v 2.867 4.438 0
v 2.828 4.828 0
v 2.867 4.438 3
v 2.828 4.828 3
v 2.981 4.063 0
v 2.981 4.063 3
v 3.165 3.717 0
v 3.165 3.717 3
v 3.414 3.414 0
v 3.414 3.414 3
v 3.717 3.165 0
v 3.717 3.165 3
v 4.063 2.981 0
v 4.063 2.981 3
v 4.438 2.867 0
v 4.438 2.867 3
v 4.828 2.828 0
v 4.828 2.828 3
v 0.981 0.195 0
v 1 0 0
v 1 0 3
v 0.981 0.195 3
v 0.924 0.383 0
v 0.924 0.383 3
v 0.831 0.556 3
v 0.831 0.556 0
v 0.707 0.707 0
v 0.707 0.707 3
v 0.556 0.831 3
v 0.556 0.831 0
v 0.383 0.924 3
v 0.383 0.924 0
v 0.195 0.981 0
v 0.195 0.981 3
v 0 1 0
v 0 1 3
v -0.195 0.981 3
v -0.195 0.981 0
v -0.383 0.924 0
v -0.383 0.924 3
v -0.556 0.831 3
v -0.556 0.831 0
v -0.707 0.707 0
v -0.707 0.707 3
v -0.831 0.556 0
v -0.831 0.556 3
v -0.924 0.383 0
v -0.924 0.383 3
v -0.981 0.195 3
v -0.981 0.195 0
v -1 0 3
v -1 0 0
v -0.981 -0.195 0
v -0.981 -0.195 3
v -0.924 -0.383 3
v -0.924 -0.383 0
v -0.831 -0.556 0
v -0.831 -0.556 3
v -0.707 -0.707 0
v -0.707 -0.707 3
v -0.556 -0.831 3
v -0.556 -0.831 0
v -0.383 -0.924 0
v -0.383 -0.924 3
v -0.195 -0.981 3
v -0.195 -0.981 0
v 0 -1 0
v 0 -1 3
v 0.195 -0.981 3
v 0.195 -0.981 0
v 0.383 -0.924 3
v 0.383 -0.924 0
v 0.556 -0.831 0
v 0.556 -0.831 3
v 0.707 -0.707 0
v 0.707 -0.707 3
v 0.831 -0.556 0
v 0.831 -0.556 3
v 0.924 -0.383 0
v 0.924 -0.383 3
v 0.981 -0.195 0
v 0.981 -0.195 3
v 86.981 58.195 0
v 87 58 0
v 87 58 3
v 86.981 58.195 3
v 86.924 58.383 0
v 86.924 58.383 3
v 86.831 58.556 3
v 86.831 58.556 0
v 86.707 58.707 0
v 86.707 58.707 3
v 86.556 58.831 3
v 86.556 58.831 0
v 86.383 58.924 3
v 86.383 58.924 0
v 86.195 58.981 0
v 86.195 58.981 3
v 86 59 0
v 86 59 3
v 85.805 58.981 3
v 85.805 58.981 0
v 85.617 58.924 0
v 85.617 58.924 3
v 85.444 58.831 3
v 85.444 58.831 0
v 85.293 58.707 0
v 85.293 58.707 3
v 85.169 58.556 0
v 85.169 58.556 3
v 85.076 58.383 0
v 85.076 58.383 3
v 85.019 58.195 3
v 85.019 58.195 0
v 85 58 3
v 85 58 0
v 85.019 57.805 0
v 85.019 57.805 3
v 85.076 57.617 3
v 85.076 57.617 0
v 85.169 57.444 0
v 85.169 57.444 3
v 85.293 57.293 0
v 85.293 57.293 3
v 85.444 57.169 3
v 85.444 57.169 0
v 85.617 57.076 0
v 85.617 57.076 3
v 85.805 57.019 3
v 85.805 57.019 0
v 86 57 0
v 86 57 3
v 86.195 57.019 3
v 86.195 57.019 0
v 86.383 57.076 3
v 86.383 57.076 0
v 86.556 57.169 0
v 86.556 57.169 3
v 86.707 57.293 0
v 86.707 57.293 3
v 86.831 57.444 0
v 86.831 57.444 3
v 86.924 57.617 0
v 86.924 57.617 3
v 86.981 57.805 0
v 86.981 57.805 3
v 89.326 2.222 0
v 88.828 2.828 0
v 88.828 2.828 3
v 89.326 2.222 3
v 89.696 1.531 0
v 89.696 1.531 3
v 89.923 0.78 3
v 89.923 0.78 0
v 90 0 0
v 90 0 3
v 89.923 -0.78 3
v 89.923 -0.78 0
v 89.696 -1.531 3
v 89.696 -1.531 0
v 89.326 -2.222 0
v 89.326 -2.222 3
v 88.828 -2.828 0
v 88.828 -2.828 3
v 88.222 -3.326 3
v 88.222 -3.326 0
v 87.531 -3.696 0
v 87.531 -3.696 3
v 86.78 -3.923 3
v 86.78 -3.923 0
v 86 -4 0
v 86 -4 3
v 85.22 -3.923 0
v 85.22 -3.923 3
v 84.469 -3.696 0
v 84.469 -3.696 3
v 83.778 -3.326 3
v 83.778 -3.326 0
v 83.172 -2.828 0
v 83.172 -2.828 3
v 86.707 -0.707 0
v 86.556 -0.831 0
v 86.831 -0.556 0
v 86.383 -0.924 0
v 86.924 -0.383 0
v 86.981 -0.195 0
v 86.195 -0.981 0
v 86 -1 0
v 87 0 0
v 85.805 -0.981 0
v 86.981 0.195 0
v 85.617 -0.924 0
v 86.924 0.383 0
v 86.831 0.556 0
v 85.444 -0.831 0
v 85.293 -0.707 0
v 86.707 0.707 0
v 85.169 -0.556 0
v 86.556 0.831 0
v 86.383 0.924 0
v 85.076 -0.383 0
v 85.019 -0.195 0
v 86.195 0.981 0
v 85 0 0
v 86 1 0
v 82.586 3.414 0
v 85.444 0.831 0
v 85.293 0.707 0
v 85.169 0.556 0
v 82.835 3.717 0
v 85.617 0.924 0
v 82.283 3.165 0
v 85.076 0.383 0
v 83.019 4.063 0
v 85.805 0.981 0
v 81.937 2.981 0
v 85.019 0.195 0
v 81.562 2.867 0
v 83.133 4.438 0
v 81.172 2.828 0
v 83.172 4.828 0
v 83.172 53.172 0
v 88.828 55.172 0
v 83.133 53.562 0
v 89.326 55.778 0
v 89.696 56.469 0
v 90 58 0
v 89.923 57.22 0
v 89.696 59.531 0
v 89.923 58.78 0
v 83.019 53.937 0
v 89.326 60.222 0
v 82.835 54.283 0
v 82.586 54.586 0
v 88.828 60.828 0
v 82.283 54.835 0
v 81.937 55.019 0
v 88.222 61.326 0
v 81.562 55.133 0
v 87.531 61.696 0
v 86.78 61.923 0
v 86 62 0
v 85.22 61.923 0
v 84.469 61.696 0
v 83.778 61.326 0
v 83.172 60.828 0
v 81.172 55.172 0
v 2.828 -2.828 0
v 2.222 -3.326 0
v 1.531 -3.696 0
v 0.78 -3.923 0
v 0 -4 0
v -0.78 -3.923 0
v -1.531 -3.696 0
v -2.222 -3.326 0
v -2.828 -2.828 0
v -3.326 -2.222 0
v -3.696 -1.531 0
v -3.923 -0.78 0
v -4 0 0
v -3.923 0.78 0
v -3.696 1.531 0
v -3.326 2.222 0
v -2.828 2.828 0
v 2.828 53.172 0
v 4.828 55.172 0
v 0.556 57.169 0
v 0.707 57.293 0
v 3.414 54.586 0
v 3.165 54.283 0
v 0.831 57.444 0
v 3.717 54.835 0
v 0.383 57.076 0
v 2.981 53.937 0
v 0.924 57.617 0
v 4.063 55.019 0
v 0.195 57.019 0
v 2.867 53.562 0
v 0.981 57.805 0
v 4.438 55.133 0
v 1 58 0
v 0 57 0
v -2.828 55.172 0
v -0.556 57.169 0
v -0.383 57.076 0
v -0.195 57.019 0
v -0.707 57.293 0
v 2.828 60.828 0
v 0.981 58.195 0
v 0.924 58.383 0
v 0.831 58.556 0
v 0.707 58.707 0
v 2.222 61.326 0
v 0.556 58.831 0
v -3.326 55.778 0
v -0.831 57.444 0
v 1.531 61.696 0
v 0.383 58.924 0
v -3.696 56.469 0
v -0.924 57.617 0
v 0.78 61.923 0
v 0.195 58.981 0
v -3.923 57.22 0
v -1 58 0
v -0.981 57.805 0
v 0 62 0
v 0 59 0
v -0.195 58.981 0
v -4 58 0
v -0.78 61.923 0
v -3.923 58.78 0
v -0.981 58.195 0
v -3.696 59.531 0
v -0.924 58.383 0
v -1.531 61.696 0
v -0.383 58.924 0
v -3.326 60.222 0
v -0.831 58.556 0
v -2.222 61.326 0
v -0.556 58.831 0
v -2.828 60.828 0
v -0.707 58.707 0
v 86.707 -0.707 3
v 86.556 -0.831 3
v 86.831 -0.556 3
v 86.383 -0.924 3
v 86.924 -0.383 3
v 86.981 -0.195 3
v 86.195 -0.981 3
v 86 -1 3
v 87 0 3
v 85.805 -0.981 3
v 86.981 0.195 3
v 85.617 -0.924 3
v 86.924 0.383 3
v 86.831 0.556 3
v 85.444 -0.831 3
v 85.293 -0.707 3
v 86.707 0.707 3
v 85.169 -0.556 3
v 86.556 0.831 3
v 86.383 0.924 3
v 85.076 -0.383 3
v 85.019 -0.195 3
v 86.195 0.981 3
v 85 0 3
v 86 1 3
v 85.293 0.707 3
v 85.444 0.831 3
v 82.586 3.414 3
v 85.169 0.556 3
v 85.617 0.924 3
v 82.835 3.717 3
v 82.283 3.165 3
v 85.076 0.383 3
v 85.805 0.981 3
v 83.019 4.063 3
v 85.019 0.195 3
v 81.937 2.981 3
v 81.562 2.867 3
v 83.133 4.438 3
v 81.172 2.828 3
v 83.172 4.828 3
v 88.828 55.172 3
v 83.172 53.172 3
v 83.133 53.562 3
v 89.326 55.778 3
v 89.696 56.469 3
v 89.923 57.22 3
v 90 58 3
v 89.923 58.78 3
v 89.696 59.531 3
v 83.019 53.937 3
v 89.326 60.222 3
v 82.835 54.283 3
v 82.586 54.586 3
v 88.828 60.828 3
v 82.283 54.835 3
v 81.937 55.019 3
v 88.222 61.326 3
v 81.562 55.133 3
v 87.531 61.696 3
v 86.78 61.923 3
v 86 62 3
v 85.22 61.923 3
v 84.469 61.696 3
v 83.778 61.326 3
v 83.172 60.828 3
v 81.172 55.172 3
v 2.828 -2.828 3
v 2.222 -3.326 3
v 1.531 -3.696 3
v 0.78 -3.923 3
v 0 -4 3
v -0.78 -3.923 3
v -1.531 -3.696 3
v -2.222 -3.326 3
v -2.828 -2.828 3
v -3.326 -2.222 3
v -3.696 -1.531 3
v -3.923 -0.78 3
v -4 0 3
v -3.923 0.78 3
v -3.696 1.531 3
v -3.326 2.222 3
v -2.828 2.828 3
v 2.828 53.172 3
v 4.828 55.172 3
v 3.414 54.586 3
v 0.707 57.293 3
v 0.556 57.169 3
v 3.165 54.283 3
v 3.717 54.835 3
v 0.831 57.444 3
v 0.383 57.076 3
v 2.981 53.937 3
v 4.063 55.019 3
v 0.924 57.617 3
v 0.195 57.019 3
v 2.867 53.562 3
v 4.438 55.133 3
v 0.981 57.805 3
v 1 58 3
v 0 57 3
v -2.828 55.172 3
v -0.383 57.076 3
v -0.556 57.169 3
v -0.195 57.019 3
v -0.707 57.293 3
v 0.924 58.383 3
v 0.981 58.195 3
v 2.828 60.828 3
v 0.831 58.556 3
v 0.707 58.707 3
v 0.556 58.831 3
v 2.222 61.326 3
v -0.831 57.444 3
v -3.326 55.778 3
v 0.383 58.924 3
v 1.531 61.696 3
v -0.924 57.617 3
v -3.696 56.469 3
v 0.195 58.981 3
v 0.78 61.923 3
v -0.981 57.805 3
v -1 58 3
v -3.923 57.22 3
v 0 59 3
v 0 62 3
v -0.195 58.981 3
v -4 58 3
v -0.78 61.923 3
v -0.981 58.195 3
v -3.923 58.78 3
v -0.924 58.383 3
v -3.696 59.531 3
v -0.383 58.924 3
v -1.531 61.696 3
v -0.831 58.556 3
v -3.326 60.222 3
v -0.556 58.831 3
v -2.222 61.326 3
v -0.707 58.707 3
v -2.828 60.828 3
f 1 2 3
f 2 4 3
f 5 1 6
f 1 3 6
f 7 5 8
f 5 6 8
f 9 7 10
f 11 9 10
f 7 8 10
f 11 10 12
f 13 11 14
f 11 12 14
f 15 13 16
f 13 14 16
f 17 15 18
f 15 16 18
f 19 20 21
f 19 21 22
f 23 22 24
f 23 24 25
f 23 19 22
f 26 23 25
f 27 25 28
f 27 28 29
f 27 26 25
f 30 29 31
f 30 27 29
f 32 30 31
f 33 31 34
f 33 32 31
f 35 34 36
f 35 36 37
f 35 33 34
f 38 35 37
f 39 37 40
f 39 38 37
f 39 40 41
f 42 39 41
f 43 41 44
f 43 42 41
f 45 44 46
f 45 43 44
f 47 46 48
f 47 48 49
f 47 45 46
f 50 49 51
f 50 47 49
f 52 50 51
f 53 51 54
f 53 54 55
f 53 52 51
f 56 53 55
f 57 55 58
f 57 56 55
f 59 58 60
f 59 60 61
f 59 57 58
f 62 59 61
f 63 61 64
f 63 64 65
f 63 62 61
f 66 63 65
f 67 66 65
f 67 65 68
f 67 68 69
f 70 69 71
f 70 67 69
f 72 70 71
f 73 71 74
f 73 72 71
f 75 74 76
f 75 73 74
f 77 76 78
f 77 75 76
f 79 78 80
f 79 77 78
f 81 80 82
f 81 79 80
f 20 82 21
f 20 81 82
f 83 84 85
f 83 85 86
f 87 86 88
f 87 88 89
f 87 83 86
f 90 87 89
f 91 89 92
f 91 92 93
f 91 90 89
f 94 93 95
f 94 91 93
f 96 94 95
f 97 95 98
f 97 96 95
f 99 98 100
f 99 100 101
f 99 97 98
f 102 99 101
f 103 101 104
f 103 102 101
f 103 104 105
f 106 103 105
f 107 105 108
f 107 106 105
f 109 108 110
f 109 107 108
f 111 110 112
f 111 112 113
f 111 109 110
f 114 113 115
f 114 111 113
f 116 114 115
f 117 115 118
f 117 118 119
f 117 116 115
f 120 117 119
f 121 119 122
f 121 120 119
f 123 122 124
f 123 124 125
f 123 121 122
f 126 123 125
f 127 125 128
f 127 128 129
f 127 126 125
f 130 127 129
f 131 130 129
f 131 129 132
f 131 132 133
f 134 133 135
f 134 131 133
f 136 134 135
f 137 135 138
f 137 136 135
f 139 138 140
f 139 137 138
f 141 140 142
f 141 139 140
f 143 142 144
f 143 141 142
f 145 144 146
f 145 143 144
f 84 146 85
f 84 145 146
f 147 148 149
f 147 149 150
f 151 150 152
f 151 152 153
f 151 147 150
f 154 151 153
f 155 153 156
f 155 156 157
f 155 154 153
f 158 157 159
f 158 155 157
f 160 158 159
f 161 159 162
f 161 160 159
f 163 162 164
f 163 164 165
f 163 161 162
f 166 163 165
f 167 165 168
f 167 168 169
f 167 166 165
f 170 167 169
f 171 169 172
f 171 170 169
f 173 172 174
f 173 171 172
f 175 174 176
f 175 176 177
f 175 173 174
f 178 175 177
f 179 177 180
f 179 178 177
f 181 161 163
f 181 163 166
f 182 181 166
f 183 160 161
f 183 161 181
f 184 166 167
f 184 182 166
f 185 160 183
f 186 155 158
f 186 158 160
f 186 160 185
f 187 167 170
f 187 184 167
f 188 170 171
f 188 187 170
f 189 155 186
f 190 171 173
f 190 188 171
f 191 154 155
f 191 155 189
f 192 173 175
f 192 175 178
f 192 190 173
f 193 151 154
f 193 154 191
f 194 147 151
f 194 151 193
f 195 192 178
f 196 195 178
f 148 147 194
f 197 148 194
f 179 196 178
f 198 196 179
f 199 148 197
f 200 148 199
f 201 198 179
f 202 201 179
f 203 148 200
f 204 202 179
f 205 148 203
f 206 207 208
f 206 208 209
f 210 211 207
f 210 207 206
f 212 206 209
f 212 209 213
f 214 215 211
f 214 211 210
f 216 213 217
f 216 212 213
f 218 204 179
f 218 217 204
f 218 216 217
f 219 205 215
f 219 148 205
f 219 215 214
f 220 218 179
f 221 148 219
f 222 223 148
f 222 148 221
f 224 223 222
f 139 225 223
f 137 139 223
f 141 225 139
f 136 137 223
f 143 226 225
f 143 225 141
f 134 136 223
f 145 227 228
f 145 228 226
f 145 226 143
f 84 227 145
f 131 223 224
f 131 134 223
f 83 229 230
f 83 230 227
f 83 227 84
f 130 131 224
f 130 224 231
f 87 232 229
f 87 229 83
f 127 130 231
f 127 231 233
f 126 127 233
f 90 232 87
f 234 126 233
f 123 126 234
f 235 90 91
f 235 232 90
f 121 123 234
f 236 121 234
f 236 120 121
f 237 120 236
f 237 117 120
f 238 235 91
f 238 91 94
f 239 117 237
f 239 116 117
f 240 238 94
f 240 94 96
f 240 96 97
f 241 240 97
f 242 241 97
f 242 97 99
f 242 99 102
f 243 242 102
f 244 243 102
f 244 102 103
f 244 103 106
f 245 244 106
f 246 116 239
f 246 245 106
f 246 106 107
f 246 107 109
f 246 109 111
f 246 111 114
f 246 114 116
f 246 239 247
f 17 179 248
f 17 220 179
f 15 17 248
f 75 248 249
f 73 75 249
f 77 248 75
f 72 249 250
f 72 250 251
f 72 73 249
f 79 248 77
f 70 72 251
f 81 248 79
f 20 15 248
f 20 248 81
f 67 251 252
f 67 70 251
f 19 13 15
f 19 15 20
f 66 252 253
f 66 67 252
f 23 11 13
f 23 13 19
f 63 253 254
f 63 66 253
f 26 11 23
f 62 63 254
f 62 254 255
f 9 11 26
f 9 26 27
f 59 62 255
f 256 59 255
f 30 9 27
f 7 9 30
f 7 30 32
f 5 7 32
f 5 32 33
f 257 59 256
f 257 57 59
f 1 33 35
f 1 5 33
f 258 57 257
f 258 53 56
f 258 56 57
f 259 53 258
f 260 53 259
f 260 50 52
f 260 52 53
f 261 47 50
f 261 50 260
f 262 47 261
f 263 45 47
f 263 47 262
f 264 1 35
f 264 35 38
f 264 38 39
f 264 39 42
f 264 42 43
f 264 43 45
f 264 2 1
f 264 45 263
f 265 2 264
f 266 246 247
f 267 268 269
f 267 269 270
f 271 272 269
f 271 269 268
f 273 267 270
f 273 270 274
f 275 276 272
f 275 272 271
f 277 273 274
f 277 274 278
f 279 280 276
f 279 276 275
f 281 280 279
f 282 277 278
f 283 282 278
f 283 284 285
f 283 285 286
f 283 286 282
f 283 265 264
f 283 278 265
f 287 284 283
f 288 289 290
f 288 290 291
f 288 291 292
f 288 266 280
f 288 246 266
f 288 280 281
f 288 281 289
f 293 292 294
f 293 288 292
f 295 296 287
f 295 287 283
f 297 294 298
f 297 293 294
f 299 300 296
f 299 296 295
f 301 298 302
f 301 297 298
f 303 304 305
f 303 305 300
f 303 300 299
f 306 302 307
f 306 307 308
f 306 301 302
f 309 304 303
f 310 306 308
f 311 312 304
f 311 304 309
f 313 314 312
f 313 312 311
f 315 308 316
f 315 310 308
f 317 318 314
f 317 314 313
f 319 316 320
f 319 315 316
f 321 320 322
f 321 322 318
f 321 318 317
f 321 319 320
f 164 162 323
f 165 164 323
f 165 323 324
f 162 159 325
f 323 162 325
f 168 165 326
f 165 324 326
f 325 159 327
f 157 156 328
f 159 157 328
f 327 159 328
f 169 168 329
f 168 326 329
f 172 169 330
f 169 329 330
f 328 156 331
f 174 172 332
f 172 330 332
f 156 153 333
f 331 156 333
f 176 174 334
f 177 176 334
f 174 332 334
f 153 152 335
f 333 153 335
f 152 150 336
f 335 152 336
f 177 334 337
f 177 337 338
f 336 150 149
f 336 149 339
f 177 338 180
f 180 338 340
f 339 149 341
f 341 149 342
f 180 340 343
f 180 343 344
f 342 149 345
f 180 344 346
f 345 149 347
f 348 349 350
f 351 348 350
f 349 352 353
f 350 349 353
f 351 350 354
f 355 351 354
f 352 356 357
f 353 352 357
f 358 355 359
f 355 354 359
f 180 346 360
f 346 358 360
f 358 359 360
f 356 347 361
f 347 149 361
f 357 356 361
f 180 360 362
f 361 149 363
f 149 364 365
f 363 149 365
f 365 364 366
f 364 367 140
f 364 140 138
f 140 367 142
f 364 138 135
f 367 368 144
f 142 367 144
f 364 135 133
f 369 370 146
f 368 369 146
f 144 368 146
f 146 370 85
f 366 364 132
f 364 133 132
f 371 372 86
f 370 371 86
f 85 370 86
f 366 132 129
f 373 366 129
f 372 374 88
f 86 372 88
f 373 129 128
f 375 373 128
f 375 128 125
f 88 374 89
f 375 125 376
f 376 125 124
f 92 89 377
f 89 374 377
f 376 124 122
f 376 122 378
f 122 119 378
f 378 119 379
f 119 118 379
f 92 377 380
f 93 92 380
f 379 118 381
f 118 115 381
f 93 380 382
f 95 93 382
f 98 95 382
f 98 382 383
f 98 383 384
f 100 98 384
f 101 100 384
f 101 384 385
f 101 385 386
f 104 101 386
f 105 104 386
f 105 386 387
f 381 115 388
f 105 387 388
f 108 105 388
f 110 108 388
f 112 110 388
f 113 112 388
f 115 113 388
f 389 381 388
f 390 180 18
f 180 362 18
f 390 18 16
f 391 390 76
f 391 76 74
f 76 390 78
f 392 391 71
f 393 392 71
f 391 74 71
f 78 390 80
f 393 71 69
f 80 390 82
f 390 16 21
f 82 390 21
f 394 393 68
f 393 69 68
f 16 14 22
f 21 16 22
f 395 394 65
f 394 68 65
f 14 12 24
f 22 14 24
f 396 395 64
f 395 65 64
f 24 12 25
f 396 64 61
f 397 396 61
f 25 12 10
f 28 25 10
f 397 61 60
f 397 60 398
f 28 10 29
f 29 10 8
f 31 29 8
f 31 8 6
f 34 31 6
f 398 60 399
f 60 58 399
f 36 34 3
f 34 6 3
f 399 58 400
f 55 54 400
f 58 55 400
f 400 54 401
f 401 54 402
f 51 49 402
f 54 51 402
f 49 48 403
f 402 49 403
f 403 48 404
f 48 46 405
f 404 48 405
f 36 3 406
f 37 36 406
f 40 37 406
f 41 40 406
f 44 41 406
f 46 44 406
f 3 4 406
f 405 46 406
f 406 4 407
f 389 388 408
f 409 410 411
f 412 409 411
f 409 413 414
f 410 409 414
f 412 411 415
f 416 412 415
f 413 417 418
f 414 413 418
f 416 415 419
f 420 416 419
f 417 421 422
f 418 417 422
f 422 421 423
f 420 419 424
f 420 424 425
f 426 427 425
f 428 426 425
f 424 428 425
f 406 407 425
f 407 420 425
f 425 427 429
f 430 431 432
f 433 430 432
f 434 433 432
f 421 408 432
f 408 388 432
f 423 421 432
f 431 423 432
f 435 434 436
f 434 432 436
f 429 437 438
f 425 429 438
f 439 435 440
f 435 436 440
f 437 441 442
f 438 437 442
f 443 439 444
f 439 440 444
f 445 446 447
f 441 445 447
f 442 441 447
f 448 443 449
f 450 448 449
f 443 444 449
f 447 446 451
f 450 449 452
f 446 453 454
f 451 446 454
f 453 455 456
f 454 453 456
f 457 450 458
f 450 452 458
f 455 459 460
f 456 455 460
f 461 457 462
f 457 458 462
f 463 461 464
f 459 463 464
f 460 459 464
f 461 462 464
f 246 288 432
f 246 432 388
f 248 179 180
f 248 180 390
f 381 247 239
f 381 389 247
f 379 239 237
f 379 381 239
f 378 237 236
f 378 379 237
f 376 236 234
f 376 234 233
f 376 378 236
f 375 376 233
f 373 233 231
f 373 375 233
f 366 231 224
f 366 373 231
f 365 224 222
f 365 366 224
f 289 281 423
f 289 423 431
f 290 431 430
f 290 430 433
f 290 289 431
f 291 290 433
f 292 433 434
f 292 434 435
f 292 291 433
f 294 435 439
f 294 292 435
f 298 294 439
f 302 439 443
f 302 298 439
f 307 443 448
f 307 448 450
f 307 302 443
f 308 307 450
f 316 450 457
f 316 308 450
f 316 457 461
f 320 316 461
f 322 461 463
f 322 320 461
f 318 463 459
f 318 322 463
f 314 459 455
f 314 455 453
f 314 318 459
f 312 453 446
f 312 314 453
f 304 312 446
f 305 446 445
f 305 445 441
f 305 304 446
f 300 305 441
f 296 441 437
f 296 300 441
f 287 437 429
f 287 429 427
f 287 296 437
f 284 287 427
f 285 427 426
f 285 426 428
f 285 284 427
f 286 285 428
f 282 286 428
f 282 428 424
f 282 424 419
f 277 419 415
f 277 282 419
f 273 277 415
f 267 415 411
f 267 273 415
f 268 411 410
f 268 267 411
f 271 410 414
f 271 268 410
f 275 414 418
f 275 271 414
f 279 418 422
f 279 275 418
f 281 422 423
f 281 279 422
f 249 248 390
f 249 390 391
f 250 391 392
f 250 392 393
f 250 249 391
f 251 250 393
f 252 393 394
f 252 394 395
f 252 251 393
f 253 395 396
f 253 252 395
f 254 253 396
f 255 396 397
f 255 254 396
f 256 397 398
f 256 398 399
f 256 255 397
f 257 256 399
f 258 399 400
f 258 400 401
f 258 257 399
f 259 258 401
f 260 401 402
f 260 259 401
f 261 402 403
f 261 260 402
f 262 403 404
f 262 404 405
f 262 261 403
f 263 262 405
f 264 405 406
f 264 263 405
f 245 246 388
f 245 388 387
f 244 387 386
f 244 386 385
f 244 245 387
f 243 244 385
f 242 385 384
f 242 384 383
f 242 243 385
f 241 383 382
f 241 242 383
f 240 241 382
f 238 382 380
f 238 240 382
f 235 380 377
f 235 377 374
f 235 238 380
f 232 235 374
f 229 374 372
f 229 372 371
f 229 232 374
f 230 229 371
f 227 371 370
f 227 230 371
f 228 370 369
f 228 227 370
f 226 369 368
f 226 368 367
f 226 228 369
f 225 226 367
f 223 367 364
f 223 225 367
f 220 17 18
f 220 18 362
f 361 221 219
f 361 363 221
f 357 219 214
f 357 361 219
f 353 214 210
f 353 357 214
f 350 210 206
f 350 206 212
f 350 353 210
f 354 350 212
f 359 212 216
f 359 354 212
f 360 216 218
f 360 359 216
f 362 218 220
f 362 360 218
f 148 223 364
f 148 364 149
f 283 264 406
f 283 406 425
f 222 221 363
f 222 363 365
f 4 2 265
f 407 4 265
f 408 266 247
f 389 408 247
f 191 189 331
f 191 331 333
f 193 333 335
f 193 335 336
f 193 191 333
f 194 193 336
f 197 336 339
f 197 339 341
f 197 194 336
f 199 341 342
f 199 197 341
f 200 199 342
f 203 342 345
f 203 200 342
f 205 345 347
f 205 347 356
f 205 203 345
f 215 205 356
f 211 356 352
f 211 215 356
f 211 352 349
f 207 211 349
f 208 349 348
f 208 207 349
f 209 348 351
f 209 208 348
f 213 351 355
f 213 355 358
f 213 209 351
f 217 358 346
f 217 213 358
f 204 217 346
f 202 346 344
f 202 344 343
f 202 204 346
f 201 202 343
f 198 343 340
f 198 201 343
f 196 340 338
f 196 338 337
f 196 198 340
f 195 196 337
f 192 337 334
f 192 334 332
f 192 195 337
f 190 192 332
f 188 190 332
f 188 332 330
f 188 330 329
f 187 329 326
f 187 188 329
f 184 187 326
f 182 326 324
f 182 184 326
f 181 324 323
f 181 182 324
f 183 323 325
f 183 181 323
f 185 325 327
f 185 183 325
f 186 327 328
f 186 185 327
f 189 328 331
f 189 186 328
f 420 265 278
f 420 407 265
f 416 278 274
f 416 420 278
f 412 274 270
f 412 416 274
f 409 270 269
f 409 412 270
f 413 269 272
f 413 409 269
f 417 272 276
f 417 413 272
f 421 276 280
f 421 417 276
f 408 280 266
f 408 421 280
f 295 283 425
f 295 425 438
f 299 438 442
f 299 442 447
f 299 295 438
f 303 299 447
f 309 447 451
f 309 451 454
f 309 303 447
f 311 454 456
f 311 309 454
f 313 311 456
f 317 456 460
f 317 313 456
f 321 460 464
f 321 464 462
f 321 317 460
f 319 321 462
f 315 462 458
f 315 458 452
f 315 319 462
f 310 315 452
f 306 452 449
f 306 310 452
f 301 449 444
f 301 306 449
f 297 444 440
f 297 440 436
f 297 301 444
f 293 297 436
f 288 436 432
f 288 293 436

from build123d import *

# Parameters (mm, degrees)
SKETCH_1_R      = 1
SKETCH_1_W      = 80.34314575
SKETCH_1_H      = 52.34314575
EXTRUDE_1_DEPTH = 3
FILLET_1_R      = 2


with BuildPart() as part:
    # 草图1 → 凸台-拉伸1 (new body)
    with BuildSketch(Plane.XY):
        with BuildLine():
            Line((2.828427125, 60.828427125), (83.171572875, 60.828427125))
            ThreePointArc((83.171572875, 60.828427125), (88.828427125, 60.828427125), (88.828427125, 55.171572875))
            Line((88.828427125, 55.171572875), (88.828427125, 2.828427125))
            ThreePointArc((88.828427125, 2.828427125), (88.828427125, -2.828427125), (83.171572875, -2.828427125))
            Line((83.171572875, -2.828427125), (2.828427125, -2.828427125))
            ThreePointArc((2.828427125, -2.828427125), (-2.828427125, -2.828427125), (-2.828427125, 2.828427125))
            Line((-2.828427125, 2.828427125), (-2.828427125, 55.171572875))
            ThreePointArc((-2.828427125, 55.171572875), (-2.828427125, 60.828427125), (2.828427125, 60.828427125))
        make_face()
        with Locations((0, 58)):
            Circle(SKETCH_1_R, mode=Mode.SUBTRACT)
        Circle(SKETCH_1_R, mode=Mode.SUBTRACT)
        with Locations((86, 58)):
            Circle(SKETCH_1_R, mode=Mode.SUBTRACT)
        with Locations((86, 0)):
            Circle(SKETCH_1_R, mode=Mode.SUBTRACT)
        with Locations((43, 29)):
            Rectangle(SKETCH_1_W, SKETCH_1_H, mode=Mode.SUBTRACT)
    extrude(amount=EXTRUDE_1_DEPTH)

    # 圆角1
    fillet_1_edges = [part.edges().sort_by_distance(p)[0] for p in [
        (83.171572875, 2.828427125, 1.5),
        (83.171572875, 55.171572875, 1.5),
        (2.828427125, 55.171572875, 1.5),
        (2.828427125, 2.828427125, 1.5),
    ]]
    fillet(fillet_1_edges, radius=FILLET_1_R)


solid = part.part
